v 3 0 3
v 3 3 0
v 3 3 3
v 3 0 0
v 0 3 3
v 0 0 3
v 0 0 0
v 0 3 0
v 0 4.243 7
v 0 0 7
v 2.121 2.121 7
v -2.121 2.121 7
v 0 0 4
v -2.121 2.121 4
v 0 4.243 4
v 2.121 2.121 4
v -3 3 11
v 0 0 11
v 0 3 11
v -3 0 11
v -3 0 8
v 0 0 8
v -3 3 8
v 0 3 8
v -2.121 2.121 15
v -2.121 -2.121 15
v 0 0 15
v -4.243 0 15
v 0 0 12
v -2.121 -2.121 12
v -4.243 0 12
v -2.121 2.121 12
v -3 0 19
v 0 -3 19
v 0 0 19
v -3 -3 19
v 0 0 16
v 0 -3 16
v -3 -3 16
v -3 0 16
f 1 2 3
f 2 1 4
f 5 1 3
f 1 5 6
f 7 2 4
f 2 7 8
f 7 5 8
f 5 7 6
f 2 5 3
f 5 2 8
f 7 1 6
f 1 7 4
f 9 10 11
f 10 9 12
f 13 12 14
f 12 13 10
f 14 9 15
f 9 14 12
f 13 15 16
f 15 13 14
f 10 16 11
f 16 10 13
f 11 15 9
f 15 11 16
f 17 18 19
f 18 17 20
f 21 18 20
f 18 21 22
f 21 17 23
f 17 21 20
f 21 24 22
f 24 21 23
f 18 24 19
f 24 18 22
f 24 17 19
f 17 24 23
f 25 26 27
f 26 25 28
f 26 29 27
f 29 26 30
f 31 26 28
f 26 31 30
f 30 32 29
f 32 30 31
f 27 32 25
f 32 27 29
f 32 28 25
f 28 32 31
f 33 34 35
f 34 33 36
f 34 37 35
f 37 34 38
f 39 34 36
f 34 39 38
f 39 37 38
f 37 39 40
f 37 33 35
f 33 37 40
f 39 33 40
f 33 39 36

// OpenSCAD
//---------------------------------------------
//*******************EJEMPLOS DIA 3************
//---------------------------------------------

//for(i=[inicio:paso:final])
//for(i=[inicio:final])

/*
for(i=[0:4]) {
    translate([0,0,4*i])
    cube([3,3,3],center=true);
}*/

/*for(i=[0:4]) {
    translate([0,0,4*i])
    cube([3,3,3]);
}*/

for(i=[0:4]){
    rotate(45*i)
    translate([0,0,4*i])
    cube([3,3,3]);
}
